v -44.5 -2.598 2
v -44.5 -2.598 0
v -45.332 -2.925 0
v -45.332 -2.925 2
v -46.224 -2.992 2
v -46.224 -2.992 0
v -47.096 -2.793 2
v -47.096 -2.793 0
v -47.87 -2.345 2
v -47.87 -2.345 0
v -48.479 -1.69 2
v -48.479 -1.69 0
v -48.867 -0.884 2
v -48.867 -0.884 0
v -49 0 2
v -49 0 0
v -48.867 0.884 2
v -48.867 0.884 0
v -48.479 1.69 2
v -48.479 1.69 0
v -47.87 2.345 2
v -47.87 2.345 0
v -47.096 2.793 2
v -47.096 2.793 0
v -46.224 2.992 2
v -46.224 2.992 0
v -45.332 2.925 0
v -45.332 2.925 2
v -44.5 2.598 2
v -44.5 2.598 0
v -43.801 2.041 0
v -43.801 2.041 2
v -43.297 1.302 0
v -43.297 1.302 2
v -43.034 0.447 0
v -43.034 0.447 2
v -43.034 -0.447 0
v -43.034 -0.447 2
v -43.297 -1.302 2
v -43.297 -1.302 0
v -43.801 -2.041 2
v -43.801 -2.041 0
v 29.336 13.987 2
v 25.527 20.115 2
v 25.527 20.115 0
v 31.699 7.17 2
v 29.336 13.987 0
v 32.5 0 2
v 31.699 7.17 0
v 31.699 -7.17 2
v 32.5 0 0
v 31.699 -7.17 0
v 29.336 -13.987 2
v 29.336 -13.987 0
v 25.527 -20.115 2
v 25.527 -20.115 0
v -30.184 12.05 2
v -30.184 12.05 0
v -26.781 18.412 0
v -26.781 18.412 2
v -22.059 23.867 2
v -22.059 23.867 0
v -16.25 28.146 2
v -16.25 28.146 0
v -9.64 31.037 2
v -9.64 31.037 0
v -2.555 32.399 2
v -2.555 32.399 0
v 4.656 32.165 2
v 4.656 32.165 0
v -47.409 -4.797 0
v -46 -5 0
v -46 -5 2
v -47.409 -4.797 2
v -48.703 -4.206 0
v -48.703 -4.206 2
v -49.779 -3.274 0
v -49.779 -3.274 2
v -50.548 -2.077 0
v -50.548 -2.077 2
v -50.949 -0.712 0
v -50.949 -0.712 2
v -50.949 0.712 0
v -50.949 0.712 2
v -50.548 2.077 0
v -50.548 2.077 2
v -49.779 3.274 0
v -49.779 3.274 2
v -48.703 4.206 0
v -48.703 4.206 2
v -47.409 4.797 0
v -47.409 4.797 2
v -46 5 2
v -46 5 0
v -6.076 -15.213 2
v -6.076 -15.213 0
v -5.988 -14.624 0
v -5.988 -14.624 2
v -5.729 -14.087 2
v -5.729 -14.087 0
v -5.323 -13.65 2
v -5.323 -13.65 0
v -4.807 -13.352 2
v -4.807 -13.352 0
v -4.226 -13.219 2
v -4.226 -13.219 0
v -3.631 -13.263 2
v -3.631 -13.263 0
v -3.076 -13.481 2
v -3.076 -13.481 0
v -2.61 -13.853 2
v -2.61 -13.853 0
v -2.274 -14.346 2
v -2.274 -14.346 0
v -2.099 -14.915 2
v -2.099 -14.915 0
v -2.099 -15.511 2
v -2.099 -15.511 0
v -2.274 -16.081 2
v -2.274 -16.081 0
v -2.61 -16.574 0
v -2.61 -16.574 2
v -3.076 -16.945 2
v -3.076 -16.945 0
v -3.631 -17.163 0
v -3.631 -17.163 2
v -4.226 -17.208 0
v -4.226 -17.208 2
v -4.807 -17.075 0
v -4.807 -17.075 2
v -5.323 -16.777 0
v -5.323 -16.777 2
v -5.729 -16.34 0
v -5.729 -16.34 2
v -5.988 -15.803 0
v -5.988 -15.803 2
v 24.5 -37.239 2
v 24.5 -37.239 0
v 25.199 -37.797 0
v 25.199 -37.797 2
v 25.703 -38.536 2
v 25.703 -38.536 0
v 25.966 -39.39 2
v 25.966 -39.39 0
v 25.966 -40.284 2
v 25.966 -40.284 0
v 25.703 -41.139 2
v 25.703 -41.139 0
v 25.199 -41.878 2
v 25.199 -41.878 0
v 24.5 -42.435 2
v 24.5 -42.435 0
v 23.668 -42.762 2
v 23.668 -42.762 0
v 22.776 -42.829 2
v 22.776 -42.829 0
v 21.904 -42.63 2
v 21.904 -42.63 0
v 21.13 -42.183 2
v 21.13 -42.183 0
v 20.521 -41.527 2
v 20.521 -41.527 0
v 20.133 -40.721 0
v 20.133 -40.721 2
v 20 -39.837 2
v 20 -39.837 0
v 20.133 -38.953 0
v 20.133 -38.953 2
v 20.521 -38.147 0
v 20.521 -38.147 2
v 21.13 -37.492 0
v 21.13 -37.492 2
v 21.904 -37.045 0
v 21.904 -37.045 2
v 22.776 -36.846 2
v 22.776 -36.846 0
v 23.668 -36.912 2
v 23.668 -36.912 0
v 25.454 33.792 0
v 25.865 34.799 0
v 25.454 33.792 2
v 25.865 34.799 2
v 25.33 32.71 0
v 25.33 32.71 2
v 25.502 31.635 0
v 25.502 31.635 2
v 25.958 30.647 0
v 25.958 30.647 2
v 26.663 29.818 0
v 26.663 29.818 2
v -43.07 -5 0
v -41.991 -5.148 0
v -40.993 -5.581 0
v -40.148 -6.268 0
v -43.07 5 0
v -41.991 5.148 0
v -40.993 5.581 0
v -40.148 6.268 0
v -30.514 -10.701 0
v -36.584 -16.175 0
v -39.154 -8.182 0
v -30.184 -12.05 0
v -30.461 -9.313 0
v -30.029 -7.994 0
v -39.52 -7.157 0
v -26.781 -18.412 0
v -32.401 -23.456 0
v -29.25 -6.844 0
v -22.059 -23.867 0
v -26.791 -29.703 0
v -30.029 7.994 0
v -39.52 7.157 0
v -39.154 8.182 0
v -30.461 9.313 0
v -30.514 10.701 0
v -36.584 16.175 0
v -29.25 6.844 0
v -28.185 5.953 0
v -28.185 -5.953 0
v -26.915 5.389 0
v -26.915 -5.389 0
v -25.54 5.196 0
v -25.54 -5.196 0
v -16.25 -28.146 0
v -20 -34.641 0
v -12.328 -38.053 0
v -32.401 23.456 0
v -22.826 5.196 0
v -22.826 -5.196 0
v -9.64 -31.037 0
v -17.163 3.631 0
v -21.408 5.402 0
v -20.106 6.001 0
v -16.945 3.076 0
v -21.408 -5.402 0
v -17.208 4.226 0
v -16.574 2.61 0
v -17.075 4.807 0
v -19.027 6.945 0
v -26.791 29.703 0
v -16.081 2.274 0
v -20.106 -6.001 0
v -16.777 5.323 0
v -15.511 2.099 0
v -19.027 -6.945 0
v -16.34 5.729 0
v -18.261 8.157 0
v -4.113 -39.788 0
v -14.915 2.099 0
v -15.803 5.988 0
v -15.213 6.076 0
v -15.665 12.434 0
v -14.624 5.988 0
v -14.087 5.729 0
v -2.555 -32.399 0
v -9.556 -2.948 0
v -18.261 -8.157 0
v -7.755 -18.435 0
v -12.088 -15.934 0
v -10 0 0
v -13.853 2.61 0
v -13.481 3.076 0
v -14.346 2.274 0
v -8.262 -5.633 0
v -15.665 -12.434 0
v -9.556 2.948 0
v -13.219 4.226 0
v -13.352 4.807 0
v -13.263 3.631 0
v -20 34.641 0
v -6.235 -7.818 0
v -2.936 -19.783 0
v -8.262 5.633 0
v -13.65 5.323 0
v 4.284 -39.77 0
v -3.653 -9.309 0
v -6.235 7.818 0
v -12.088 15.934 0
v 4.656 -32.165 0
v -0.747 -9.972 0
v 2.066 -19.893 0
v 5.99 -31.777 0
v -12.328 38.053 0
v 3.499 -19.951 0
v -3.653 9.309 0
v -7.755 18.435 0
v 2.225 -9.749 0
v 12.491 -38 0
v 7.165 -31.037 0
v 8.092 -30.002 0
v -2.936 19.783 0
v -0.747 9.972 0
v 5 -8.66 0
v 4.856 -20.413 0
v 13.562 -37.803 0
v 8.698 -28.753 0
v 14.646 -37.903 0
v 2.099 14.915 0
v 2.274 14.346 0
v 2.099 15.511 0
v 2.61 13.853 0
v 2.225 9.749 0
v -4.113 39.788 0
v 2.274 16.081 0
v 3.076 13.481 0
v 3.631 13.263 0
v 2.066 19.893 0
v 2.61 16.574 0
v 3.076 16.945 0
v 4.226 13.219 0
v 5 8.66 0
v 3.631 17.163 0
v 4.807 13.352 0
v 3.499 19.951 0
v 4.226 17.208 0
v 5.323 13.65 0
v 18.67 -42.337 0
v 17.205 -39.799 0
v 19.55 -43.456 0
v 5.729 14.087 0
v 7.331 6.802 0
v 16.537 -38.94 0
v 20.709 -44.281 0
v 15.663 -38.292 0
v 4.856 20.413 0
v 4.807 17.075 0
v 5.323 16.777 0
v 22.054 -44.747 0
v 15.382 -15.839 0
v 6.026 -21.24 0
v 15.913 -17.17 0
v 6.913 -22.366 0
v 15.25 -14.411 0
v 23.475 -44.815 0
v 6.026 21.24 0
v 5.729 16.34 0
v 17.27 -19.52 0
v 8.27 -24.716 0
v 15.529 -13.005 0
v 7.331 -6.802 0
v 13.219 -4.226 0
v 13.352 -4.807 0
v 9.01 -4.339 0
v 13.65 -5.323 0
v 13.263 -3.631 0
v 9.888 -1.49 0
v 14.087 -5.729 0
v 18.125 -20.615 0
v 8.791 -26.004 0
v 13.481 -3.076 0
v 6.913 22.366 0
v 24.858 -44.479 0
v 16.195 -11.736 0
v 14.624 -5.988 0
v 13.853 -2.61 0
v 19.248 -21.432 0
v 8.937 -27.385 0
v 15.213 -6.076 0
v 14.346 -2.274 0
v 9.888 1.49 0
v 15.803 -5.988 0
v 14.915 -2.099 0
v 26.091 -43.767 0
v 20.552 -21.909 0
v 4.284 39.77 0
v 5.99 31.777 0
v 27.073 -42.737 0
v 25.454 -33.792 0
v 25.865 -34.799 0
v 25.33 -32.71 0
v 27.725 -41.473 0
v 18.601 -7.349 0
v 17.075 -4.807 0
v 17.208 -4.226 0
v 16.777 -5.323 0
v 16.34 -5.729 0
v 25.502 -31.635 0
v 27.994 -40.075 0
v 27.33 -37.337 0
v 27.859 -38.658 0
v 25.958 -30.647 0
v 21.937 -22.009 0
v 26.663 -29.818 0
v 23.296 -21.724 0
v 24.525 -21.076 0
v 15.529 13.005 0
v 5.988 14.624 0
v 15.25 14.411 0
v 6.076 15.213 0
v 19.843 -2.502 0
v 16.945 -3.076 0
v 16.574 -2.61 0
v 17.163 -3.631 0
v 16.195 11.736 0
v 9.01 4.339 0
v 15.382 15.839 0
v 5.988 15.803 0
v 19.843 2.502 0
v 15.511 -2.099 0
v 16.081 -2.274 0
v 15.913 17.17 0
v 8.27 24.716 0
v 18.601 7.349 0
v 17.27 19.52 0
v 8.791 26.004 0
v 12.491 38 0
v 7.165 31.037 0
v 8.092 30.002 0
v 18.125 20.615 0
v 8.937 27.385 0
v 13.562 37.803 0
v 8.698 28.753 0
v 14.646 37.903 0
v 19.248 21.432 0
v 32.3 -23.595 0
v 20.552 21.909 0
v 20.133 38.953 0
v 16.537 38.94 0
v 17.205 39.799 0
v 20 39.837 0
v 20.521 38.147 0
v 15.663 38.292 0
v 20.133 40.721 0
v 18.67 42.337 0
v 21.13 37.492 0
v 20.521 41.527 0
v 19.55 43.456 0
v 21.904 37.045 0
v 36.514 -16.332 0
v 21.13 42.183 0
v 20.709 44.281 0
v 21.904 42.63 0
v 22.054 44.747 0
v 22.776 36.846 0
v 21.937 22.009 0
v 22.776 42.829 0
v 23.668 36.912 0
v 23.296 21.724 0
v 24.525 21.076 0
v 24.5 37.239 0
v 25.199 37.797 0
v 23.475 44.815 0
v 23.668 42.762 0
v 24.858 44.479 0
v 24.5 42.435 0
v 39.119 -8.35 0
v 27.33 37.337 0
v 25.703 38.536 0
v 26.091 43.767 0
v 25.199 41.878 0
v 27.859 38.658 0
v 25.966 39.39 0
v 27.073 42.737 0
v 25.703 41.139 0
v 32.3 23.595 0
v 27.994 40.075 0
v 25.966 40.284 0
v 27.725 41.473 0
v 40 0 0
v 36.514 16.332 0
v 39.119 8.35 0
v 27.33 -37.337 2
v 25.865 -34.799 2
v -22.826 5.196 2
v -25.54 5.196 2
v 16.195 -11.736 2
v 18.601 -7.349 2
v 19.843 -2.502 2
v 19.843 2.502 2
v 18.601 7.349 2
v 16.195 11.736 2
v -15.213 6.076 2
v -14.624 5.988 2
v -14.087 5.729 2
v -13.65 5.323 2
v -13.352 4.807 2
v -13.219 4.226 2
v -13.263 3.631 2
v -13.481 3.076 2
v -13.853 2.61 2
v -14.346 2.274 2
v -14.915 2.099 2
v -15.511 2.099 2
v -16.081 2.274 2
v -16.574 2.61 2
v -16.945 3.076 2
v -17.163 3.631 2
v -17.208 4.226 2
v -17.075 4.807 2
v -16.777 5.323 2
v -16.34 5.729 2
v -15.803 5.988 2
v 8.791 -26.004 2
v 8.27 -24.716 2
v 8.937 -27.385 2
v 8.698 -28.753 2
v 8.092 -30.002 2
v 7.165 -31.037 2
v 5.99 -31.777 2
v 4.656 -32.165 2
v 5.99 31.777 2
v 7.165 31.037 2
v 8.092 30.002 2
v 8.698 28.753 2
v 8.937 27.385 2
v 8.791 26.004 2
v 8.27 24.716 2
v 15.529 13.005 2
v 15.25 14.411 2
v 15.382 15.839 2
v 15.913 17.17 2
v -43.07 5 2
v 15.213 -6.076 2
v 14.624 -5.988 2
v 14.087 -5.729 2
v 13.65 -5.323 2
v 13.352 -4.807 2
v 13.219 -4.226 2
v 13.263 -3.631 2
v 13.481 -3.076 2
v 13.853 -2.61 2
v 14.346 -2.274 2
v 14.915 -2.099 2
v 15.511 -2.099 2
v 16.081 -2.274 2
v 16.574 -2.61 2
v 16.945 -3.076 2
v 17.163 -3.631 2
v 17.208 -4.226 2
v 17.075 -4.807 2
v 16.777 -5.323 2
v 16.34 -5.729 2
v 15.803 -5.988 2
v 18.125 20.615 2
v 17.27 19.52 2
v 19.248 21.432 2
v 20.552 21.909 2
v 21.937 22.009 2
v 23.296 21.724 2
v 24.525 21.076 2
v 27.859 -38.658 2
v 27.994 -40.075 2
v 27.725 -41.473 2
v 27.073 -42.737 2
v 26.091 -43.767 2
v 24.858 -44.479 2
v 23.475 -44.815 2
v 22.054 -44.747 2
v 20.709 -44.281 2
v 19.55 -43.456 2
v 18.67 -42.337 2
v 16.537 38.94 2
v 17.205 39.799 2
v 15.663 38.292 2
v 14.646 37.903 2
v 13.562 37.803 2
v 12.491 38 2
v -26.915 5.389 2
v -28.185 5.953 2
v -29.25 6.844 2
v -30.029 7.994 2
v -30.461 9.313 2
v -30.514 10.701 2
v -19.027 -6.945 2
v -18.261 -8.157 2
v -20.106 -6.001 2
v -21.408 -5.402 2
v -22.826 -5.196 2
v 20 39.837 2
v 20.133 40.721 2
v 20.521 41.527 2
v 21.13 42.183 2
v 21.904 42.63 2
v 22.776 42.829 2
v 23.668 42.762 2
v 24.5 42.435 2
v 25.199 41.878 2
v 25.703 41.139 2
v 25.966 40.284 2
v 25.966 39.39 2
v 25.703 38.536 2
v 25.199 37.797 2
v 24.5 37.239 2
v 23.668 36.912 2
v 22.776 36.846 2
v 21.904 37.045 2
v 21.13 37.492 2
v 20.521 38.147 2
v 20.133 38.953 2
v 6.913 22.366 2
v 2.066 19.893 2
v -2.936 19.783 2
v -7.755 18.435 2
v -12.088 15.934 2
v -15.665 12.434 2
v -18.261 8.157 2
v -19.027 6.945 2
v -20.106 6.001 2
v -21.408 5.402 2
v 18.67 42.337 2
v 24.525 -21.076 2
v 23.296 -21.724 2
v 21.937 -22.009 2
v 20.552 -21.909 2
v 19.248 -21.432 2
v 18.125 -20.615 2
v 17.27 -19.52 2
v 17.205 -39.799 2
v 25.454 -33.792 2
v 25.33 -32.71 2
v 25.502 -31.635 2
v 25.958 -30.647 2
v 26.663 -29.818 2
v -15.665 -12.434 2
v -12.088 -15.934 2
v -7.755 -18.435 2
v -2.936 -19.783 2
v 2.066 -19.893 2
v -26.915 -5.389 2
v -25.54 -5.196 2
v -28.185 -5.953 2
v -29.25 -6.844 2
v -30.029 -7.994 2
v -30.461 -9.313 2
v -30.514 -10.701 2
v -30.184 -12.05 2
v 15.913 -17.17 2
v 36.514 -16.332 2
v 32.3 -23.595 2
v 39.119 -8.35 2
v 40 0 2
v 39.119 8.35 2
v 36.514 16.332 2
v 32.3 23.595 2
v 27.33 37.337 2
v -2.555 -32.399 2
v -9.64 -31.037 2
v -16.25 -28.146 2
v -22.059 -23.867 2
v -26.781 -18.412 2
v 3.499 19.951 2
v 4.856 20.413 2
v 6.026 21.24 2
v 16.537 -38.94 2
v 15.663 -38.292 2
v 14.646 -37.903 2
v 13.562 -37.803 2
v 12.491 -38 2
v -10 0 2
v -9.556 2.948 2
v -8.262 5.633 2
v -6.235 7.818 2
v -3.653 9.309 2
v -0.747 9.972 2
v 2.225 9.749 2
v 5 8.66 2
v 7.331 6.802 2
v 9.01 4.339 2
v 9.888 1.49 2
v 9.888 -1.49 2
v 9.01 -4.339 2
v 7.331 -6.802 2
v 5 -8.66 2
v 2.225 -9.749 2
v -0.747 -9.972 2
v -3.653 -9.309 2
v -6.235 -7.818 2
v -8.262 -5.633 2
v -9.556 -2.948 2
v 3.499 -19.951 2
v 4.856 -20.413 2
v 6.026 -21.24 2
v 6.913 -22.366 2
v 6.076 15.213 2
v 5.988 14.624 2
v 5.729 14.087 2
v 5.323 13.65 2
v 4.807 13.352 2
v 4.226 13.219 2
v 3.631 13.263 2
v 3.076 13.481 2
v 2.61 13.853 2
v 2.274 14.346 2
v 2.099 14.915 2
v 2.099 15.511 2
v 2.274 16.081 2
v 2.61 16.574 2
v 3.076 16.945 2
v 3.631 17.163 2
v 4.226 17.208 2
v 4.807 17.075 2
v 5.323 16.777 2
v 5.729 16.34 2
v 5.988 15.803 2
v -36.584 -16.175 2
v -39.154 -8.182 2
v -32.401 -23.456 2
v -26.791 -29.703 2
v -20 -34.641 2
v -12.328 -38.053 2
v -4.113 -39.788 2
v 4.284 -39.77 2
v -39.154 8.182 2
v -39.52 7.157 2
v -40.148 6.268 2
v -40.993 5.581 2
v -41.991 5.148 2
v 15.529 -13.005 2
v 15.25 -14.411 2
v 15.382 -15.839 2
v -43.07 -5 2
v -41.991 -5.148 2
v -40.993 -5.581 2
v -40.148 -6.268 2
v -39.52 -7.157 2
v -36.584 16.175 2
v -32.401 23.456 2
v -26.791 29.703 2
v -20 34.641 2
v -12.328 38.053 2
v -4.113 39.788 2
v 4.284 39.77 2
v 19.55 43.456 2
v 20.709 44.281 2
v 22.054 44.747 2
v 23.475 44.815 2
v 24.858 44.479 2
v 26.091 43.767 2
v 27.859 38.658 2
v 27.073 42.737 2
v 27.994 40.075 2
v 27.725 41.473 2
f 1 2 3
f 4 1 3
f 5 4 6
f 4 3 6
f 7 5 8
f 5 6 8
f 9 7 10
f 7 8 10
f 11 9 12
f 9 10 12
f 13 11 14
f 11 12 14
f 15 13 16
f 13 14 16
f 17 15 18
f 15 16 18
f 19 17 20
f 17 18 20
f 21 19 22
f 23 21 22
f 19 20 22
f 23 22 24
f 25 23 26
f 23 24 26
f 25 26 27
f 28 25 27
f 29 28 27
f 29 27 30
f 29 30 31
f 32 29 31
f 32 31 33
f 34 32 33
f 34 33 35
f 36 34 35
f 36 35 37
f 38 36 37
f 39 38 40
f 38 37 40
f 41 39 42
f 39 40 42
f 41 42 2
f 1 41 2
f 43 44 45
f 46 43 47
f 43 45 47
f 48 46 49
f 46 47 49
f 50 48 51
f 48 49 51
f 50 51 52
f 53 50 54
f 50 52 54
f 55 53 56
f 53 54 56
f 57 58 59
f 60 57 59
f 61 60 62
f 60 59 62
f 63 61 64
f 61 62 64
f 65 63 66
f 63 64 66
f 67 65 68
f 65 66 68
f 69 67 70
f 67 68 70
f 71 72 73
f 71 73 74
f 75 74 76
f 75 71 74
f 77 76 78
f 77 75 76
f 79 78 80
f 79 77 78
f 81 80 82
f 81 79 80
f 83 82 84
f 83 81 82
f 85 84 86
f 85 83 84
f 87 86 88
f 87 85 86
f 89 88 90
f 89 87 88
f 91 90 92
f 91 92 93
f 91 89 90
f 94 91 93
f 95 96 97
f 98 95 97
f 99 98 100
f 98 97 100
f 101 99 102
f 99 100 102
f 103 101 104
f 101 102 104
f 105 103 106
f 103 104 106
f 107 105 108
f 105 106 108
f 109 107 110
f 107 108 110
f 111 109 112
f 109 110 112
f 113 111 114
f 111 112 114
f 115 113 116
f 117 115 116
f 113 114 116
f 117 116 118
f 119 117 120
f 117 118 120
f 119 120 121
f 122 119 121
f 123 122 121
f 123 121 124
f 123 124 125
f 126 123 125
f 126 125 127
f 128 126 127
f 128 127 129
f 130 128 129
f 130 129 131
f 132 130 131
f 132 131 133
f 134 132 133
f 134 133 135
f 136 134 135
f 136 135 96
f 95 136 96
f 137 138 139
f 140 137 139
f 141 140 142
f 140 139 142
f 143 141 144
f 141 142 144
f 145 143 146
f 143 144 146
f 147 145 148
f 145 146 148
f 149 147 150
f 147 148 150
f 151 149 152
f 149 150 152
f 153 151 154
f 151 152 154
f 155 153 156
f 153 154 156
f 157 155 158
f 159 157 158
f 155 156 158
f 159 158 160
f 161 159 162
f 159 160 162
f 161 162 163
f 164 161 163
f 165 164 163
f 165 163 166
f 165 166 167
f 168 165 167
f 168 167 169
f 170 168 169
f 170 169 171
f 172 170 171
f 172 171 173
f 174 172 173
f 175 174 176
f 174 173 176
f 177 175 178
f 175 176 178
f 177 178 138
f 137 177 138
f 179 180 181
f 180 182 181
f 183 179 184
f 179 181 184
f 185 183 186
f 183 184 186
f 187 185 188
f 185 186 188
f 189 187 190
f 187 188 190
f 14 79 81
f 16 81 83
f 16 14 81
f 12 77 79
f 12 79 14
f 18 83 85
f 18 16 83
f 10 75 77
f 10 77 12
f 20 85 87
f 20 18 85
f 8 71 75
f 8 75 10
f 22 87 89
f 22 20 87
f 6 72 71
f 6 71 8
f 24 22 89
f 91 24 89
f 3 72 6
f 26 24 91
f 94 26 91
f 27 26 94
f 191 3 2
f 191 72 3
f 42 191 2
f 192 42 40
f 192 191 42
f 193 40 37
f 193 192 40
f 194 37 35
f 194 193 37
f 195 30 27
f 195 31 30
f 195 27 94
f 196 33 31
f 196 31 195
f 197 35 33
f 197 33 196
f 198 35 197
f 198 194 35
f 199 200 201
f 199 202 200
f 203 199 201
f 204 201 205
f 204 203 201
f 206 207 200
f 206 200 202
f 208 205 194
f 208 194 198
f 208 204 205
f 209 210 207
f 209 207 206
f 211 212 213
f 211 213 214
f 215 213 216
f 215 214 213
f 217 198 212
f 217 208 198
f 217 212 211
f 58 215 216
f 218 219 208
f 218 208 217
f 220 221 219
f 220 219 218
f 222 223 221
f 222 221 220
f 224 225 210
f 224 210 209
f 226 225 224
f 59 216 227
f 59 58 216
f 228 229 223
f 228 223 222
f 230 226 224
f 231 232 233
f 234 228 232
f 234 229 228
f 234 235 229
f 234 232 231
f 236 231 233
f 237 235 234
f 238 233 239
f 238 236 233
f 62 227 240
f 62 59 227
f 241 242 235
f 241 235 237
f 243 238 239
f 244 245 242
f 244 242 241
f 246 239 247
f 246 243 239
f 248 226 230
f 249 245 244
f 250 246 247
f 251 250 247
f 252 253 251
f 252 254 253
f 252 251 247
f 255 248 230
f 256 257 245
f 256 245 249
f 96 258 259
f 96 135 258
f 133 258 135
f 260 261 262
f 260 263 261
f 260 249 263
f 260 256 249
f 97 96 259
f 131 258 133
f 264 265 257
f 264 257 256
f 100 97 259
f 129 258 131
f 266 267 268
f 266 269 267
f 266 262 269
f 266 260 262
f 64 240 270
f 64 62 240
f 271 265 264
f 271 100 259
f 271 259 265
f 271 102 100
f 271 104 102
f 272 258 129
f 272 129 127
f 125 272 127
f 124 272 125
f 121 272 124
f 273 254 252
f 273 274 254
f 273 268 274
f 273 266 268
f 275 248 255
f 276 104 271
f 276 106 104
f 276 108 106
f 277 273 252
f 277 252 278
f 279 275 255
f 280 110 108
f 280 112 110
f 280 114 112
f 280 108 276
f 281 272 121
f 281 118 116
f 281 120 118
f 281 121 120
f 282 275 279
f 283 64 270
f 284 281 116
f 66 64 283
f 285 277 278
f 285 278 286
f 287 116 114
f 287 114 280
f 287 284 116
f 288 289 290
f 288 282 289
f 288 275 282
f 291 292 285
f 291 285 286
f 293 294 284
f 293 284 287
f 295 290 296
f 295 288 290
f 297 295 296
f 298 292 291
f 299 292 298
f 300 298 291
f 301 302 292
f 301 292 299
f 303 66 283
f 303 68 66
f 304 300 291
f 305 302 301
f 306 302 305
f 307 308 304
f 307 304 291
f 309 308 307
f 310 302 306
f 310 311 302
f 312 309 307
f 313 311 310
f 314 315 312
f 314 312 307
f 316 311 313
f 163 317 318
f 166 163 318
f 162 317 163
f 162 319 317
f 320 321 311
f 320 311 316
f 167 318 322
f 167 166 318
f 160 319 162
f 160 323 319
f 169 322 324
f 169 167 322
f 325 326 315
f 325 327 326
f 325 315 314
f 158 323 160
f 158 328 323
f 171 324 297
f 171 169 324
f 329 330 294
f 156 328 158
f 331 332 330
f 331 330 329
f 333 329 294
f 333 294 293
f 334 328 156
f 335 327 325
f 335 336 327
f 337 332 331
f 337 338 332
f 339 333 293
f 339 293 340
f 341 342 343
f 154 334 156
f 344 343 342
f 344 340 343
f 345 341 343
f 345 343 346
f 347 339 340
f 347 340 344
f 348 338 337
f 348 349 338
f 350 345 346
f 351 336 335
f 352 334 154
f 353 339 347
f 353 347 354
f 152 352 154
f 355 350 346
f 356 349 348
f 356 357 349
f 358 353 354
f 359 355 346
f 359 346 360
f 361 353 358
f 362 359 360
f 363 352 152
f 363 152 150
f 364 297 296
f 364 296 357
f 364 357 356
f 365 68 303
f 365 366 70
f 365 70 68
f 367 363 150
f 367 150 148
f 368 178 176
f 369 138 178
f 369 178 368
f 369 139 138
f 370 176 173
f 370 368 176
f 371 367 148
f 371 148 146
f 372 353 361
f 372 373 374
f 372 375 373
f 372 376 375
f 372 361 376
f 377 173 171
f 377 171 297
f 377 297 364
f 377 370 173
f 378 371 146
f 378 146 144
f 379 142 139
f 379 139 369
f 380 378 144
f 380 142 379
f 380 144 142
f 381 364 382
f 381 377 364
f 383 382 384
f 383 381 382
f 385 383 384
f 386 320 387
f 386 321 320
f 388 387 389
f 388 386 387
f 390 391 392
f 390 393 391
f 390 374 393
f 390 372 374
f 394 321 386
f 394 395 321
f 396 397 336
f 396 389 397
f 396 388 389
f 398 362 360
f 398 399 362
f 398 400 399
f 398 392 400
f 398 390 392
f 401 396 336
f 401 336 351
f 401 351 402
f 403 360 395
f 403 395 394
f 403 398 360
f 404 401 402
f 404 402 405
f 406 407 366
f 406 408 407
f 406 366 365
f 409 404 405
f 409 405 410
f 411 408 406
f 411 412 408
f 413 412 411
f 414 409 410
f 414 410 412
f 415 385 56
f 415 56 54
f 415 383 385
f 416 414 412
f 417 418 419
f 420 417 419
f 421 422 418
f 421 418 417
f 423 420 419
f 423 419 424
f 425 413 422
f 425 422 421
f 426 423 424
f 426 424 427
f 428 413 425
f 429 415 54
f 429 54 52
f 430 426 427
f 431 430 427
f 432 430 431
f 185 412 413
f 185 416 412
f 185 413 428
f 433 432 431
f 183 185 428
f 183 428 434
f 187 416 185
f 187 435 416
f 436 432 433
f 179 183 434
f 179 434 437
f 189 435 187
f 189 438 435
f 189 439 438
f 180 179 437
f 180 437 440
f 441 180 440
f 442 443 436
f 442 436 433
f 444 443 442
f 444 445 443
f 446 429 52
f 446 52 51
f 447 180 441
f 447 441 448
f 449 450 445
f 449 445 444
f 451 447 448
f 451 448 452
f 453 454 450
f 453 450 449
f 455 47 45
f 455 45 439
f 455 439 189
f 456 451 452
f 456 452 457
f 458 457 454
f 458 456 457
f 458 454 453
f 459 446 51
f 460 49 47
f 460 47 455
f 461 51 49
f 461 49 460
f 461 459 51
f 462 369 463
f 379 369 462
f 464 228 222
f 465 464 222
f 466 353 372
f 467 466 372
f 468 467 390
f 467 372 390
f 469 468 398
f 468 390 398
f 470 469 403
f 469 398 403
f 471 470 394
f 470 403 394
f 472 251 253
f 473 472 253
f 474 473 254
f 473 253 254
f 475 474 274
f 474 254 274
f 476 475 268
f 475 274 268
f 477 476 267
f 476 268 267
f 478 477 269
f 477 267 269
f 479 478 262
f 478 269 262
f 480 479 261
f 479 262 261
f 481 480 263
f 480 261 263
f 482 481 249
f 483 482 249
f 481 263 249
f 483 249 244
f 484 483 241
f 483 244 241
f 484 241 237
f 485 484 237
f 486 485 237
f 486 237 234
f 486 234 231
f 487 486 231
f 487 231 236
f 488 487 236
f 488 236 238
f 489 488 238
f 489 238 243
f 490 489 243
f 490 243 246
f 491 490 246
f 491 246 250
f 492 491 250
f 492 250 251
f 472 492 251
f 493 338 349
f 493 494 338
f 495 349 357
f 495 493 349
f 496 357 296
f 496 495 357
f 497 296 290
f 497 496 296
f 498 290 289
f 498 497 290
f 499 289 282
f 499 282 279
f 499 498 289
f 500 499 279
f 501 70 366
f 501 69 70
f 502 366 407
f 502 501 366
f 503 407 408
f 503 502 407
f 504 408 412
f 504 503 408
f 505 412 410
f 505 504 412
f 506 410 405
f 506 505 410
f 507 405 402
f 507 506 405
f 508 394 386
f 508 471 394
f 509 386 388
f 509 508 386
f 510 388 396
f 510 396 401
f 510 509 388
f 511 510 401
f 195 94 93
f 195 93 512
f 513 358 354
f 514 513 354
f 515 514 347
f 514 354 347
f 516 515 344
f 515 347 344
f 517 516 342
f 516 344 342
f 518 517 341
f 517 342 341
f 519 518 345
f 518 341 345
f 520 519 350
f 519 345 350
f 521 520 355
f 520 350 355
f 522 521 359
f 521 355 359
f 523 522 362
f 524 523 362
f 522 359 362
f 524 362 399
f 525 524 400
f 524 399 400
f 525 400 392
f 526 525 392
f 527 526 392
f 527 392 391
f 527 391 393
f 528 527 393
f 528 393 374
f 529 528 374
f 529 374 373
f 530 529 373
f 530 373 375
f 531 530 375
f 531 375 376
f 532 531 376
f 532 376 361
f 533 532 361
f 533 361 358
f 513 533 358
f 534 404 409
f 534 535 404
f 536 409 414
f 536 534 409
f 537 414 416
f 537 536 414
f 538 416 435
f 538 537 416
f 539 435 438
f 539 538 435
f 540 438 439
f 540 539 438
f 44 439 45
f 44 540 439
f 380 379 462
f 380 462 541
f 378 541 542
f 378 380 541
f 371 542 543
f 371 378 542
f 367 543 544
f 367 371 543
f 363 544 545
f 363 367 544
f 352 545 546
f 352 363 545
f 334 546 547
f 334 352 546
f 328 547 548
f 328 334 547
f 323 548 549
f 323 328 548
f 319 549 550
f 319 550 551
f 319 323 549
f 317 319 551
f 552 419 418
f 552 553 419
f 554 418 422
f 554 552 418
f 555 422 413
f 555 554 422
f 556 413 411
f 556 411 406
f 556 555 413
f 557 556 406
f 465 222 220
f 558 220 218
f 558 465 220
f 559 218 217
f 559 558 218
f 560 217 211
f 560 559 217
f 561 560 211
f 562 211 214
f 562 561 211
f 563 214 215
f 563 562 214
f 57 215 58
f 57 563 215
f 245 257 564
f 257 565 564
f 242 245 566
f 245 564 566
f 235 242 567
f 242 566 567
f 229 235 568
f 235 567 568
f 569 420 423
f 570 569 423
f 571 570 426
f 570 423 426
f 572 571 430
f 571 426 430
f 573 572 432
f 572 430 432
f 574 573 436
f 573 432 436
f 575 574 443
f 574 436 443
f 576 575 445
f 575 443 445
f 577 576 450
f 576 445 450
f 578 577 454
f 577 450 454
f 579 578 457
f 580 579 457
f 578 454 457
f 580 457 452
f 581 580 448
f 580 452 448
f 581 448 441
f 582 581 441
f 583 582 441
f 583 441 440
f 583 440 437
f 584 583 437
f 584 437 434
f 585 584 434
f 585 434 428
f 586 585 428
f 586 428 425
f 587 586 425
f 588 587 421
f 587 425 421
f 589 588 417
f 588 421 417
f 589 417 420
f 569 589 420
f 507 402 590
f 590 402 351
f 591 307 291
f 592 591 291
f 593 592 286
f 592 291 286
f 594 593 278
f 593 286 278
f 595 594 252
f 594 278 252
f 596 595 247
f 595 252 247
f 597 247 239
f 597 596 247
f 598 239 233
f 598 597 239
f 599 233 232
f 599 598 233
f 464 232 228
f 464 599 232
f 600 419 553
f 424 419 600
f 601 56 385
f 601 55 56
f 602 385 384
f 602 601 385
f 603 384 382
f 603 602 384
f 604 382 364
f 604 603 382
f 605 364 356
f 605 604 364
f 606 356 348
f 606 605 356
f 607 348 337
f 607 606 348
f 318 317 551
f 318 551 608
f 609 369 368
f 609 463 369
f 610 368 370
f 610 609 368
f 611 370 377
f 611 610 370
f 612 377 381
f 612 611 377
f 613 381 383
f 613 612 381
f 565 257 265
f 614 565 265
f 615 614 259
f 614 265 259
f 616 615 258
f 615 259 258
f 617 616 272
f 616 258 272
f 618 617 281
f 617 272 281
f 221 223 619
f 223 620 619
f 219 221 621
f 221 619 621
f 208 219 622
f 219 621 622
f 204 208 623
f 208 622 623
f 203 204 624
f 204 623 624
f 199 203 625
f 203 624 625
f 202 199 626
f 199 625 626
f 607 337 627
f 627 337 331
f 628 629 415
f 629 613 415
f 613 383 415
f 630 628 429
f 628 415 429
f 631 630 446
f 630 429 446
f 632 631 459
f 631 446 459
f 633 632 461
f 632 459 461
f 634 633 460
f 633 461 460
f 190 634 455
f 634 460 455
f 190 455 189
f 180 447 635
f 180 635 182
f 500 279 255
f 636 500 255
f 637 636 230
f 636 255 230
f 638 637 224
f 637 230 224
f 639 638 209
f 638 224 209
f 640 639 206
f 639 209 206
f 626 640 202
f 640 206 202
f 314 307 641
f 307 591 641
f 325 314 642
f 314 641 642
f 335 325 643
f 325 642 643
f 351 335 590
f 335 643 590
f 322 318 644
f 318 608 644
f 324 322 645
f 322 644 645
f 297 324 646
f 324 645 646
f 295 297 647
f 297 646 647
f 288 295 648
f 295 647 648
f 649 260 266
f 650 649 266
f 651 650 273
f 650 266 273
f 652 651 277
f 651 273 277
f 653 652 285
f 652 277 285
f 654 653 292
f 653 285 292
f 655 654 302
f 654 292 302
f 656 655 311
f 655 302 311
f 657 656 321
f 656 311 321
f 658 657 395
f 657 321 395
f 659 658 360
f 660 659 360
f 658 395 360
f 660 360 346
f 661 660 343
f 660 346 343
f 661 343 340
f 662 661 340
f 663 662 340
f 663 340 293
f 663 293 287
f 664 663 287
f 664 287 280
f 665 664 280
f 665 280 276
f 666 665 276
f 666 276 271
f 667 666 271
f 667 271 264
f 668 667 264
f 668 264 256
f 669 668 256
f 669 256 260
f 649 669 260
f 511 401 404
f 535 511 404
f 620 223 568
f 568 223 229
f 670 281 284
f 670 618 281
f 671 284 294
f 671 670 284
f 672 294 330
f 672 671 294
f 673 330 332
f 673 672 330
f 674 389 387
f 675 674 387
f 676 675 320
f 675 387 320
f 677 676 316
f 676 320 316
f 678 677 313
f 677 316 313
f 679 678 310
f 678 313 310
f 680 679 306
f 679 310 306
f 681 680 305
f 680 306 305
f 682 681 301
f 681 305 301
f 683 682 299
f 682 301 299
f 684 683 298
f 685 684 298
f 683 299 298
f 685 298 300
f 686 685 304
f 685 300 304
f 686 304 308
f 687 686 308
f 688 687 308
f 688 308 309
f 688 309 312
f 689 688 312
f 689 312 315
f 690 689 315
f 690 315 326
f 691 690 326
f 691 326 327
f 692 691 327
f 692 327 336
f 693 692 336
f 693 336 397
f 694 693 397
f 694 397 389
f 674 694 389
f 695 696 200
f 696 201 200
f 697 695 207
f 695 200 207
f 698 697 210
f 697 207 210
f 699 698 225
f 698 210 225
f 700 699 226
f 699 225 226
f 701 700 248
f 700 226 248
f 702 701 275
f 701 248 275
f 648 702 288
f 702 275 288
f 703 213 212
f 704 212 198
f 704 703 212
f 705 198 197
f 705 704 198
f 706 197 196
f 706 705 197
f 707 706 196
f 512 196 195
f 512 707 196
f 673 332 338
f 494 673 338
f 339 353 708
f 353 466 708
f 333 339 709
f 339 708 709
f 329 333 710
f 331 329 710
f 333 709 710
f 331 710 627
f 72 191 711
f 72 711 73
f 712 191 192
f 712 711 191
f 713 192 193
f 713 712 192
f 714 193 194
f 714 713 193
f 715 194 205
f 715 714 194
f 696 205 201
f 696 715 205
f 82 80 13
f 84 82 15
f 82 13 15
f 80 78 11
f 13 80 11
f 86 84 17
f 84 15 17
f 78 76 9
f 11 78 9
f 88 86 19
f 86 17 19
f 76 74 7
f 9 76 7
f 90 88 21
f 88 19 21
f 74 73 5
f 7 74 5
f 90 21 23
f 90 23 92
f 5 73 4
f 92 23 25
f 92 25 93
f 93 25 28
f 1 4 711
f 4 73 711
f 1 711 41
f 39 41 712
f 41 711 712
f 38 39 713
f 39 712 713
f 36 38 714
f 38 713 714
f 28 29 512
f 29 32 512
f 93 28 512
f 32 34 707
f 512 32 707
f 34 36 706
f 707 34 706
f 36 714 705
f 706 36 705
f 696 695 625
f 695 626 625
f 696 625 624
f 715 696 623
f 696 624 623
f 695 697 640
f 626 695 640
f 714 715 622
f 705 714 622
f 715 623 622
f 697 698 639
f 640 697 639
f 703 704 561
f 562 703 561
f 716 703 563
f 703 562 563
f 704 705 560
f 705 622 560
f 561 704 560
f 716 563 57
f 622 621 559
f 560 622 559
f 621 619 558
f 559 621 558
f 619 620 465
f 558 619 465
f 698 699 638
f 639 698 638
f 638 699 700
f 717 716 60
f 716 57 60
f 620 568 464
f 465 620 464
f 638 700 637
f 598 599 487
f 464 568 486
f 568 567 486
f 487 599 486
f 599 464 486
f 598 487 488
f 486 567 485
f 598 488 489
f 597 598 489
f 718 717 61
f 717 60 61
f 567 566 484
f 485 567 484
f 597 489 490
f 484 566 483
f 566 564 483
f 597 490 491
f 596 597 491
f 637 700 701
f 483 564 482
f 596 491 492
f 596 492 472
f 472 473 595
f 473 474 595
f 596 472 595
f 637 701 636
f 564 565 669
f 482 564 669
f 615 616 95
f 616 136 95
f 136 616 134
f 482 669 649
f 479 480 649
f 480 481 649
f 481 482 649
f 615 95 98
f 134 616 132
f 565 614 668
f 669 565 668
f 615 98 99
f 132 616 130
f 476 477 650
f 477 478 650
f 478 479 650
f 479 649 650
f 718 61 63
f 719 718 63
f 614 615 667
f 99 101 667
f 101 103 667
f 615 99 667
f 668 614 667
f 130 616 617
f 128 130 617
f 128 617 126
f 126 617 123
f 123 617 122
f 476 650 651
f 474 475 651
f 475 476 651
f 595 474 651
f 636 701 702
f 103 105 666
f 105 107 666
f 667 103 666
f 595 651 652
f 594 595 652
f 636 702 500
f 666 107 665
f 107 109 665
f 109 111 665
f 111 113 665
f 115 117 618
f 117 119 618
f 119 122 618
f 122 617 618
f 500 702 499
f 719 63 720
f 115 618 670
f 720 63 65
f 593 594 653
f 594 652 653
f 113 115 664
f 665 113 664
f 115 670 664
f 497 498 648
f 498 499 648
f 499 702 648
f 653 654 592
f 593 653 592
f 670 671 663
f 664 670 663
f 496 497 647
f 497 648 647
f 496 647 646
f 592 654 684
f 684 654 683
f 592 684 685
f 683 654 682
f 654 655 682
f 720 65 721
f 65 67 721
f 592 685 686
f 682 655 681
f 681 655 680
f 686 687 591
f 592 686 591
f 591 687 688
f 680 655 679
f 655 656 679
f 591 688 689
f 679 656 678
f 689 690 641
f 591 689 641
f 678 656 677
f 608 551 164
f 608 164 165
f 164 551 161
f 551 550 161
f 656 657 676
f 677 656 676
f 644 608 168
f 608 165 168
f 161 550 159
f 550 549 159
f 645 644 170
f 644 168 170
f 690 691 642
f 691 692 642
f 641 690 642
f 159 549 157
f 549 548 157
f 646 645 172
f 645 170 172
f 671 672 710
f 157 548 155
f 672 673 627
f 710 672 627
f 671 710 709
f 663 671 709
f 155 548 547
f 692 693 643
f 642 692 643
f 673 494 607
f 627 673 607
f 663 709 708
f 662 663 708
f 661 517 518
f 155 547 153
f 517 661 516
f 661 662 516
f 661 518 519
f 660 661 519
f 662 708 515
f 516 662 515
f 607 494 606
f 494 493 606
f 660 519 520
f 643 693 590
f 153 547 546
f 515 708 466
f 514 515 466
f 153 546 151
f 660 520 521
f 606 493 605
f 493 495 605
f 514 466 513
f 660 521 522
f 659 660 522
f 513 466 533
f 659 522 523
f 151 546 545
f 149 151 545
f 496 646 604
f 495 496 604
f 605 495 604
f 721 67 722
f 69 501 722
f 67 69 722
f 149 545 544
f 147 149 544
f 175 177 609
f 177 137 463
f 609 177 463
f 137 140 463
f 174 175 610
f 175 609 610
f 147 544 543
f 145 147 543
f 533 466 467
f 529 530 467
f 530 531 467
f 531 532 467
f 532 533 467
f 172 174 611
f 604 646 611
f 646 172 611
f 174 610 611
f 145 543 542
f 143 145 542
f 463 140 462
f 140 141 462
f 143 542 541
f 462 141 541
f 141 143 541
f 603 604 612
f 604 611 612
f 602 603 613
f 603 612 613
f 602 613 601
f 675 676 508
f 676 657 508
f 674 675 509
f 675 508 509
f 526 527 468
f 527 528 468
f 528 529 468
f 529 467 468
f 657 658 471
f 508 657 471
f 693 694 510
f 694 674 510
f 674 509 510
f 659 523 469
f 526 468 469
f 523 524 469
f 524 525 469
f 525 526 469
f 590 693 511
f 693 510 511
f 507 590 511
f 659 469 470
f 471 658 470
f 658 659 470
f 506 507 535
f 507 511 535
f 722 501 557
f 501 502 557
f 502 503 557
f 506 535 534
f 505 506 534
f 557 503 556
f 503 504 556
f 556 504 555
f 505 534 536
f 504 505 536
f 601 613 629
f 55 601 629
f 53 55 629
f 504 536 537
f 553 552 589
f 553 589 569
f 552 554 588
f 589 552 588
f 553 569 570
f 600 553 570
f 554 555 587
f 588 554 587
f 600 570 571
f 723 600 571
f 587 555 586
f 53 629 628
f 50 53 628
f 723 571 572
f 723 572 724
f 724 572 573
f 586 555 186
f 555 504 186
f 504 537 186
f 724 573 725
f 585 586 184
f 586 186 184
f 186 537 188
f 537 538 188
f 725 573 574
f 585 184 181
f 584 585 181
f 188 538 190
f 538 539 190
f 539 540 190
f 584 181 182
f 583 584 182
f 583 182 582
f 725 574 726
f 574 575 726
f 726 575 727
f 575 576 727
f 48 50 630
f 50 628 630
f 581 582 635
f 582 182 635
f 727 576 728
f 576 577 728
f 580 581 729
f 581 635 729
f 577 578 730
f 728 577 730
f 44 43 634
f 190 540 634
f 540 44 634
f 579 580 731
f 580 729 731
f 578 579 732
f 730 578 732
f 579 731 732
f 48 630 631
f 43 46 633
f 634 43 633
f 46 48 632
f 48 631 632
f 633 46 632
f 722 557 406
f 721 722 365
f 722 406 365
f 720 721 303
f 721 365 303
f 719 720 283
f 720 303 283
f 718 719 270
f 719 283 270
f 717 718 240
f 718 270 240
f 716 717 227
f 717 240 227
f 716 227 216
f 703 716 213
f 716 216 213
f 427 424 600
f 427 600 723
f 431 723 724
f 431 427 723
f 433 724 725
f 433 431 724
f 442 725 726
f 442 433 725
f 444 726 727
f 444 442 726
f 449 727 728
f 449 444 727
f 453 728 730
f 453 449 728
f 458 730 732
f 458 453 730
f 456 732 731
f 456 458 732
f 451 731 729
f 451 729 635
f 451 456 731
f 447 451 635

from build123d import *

# Parameters (mm, degrees)
SKETCH1_R                = 40
BOSS_EXTRUDE1_DEPTH      = 2
SKETCH4_R                = 3
BOSS_EXTRUDE3_DEPTH      = 2
FILLET2_R                = 4
CIRPATTERN2_COUNT        = 3
FILLET2_OF_CIRPATTERN2_R = 4
SKETCH5_R                = 10
CUT_EXTRUDE1_DEPTH       = 8
CUT_EXTRUDE3_DEPTH       = 15
FILLET3_R                = 5
CIRPATTERN4_COUNT        = 3
FILLET3_OF_CIRPATTERN4_R = 5
SKETCH6_R                = 2
CUT_EXTRUDE4_DEPTH       = 10
CIRPATTERN5_COUNT        = 4


with BuildPart() as part:
    # Sketch1 → Boss-Extrude1 (new body)
    with BuildSketch(Plane.XY):
        Circle(SKETCH1_R)
    extrude(amount=BOSS_EXTRUDE1_DEPTH)

    # Sketch4 → Boss-Extrude3 (add)
    with BuildSketch(Plane(origin=(0, 0, 0), x_dir=(-1, 0, 0), z_dir=(0, 0, -1))):
        with BuildLine():
            Line((-15.513007814, 36.869317712), (-18.669872981, 42.337168574))
            ThreePointArc((-18.669872981, 42.337168574), (-25.5, 44.167295593), (-27.330127019, 37.337168574))
            Line((-27.330127019, 37.337168574), (-24.173261852, 31.869317712))
            ThreePointArc((-24.173261852, 31.869317712), (-20, 34.641016151), (-15.513007814, 36.869317712))
        make_face()
        with Locations((-23, 39.837168574)):
            Circle(SKETCH4_R, mode=Mode.SUBTRACT)
    boss_extrude3 = extrude(amount=-BOSS_EXTRUDE3_DEPTH)

    # Fillet2
    fillet2_edges = [part.edges().sort_by_distance(p)[0] for p in [
        (24.173261852, 31.869317712, 1),
        (15.513007814, 36.869317712, 1),
    ]]
    fillet(fillet2_edges, radius=FILLET2_R)

    # CirPattern2: Boss-Extrude3 ×3 about axis
    cirpattern2_axis = Axis((0, 0, 2), (0, 0, -1))
    for i in range(1, CIRPATTERN2_COUNT):
        add(boss_extrude3.rotate(cirpattern2_axis, i * 360 / CIRPATTERN2_COUNT))

    # Fillet2 of CirPattern2
    fillet2_of_cirpattern2_edges = [part.edges().sort_by_distance(p)[0] for p in [
        (15.513007814, -36.869317712, 1),
        (24.173261852, -31.869317712, 1),
        (-39.686269666, 5, 1),
        (-39.686269666, -5, 1),
    ]]
    fillet(fillet2_of_cirpattern2_edges, radius=FILLET2_OF_CIRPATTERN2_R)

    # Sketch5 → Cut-Extrude1 (cut)
    with BuildSketch(Plane(origin=(0, 0, 0), x_dir=(-1, 0, 0), z_dir=(0, 0, -1))):
        Circle(SKETCH5_R)
    extrude(amount=-CUT_EXTRUDE1_DEPTH, mode=Mode.SUBTRACT)

    # Sketch7 → Cut-Extrude3 (cut)
    with BuildSketch(Plane(origin=(0, 0, 0), x_dir=(-1, 0, 0), z_dir=(0, 0, -1))):
        with BuildLine():
            ThreePointArc((-5.156603958, 19.323804895), (10, 17.320508076), (19.313207916, 5.196152423))
            Line((19.313207916, 5.196152423), (32.081926376, 5.196152423))
            ThreePointArc((32.081926376, 5.196152423), (16.25, 28.145825623), (-11.540963188, 30.381839455))
            Line((-11.540963188, 30.381839455), (-5.156603958, 19.323804895))
        make_face()
    cut_extrude3 = extrude(amount=-CUT_EXTRUDE3_DEPTH, mode=Mode.SUBTRACT)

    # Fillet3
    fillet3_edges = [part.edges().sort_by_distance(p)[0] for p in [
        (-32.081926376, 5.196152423, 1),
        (-19.313207916, 5.196152423, 1),
        (5.156603958, 19.323804895, 1),
        (11.540963188, 30.381839455, 1),
    ]]
    fillet(fillet3_edges, radius=FILLET3_R)

    # CirPattern4: Cut-Extrude3 ×3 about axis
    cirpattern4_axis = Axis((0, 0, 2), (0, 0, -1))
    for i in range(1, CIRPATTERN4_COUNT):
        add(cut_extrude3.rotate(cirpattern4_axis, i * 360 / CIRPATTERN4_COUNT), mode=Mode.SUBTRACT)

    # Fillet3 of CirPattern4
    fillet3_of_cirpattern4_edges = [part.edges().sort_by_distance(p)[0] for p in [
        (20.540963188, 25.185687033, 1),
        (14.156603958, 14.127652472, 1),
        (14.156603958, -14.127652472, 1),
        (20.540963188, -25.185687033, 1),
        (11.540963188, -30.381839455, 1),
        (5.156603958, -19.323804895, 1),
        (-19.313207916, -5.196152423, 1),
        (-32.081926376, -5.196152423, 1),
    ]]
    fillet(fillet3_of_cirpattern4_edges, radius=FILLET3_OF_CIRPATTERN4_R)

    # Sketch6 → Cut-Extrude4 (cut)
    with BuildSketch(Plane(origin=(0, 0, 0), x_dir=(-1, 0, 0), z_dir=(0, 0, -1))):
        with Locations((4.07639996, -15.213331764)):
            Circle(SKETCH6_R)
    cut_extrude4 = extrude(amount=-CUT_EXTRUDE4_DEPTH, mode=Mode.SUBTRACT)

    # CirPattern5: Cut-Extrude4 ×4 about axis
    cirpattern5_axis = Axis((0, 0, 8), (0, 0, -1))
    for i in range(1, CIRPATTERN5_COUNT):
        add(cut_extrude4.rotate(cirpattern5_axis, i * 360 / CIRPATTERN5_COUNT), mode=Mode.SUBTRACT)


solid = part.part
